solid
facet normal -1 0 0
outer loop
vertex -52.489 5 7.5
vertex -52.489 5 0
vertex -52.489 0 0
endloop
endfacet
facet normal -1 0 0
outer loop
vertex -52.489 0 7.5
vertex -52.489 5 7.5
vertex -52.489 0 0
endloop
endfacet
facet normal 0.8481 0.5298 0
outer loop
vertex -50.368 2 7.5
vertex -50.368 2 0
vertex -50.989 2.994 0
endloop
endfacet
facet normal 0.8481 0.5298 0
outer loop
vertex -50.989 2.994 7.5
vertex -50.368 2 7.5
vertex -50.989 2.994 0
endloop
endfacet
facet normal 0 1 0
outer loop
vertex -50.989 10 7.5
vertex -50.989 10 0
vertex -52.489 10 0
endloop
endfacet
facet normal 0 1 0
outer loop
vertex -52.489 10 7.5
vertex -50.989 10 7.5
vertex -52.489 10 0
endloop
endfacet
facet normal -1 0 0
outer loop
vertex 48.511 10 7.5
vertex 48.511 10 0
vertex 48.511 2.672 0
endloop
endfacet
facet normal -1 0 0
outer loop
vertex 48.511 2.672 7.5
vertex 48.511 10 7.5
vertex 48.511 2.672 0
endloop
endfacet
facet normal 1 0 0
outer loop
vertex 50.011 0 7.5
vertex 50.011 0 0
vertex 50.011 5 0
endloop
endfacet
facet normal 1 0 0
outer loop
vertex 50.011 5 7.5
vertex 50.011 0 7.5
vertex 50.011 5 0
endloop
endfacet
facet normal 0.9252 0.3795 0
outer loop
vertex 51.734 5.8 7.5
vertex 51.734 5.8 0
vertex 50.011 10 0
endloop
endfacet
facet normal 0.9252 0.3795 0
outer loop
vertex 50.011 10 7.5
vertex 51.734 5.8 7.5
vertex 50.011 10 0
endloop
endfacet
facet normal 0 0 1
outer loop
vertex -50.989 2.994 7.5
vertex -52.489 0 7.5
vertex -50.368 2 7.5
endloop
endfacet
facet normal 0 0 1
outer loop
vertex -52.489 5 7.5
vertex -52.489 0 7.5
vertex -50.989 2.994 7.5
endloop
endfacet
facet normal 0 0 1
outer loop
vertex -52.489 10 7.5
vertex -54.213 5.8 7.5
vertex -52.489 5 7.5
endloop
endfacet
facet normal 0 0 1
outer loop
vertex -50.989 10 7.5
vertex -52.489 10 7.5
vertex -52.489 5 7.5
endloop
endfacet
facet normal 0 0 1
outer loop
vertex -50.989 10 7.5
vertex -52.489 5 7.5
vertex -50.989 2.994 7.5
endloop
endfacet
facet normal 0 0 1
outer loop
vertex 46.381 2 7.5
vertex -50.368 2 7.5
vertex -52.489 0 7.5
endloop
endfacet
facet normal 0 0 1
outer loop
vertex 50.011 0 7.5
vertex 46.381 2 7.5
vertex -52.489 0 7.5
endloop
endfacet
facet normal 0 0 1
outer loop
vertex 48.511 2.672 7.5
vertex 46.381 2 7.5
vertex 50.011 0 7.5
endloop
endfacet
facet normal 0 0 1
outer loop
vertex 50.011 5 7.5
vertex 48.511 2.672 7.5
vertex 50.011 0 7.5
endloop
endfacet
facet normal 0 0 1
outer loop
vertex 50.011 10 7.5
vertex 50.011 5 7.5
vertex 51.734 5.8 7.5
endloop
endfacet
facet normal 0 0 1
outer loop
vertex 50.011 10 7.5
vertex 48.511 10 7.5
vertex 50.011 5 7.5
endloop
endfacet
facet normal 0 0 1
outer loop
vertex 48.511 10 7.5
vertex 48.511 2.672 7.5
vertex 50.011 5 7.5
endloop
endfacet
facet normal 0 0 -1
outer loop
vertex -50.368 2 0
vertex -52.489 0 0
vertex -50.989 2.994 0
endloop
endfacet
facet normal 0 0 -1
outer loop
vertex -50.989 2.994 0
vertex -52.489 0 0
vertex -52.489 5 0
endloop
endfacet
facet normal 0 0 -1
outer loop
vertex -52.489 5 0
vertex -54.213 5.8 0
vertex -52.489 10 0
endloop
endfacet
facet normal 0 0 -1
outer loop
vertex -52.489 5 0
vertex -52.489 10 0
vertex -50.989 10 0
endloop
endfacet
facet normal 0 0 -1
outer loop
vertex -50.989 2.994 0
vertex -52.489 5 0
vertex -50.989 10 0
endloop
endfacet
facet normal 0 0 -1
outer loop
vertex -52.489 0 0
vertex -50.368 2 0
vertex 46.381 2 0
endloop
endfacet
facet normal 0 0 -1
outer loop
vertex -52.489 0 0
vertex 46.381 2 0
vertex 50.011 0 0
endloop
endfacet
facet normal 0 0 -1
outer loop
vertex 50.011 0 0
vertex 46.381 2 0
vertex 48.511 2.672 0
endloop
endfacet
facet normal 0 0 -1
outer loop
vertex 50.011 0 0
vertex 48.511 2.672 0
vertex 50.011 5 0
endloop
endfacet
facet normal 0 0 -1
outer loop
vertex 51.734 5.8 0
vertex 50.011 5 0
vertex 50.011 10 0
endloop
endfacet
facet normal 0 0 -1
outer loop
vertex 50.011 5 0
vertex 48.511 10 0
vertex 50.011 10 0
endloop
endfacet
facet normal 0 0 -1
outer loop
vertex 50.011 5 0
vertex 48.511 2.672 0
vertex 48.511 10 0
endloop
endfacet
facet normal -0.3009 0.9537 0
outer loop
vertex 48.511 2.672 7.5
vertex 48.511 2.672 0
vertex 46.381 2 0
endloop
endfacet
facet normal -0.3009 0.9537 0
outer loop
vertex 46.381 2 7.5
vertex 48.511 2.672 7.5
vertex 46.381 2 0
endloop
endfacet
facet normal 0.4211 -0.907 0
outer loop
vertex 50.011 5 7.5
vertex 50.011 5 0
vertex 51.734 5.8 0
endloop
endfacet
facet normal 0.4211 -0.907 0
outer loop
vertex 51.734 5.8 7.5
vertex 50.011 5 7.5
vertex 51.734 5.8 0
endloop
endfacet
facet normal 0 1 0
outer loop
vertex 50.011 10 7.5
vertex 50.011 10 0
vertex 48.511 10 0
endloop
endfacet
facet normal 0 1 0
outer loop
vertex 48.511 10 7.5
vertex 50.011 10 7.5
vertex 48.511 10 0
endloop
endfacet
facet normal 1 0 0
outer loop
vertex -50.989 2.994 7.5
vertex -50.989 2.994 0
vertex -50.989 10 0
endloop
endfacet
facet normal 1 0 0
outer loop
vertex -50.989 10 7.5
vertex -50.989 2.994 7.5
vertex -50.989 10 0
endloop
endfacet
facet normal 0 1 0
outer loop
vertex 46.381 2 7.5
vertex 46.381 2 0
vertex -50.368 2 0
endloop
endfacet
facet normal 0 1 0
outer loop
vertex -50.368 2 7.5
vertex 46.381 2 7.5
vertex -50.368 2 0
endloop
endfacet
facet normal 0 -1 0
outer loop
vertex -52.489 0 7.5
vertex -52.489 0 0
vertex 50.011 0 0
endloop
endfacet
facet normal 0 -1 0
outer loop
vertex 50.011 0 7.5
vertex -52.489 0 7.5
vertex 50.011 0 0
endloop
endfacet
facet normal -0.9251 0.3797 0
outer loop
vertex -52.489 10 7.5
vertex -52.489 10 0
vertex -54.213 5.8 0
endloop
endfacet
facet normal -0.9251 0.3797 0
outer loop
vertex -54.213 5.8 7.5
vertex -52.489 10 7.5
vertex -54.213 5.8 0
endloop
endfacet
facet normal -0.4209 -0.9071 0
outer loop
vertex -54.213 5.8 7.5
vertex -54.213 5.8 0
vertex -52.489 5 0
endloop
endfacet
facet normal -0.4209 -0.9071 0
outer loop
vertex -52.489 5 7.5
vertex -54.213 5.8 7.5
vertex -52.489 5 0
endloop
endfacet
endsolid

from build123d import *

# Parameters (mm, degrees)
F1_DEPTH = 7.5


with BuildPart() as f1:
    # F0 (on Top) → F1 (new body)
    with BuildSketch(Plane.XY):
        Polygon((-50.989201, 2), (-52.489201, 2), (-52.489201, 0), (50.010799, 0), (50.010799, 2), (48.510799, 2), (46.381295, 2), (-50.367929, 2), align=None)
        Polygon((48.510799, 2), (50.010799, 2), (50.010799, 5), (50.010799, 10), (48.510799, 10), (48.510799, 2.672095), align=None)
        Polygon((48.510799, 2.672095), (46.381295, 2), (48.510799, 2), align=None)
        Polygon((-52.489201, 5), (-52.489201, 2), (-50.989201, 2), (-50.989201, 2.994474), (-50.989201, 10), (-52.489201, 10), align=None)
        Polygon((50.010799, 10), (50.010799, 5), (51.734168, 5.8), align=None)
        Polygon((-54.21257, 5.8), (-52.489201, 5), (-52.489201, 10), align=None)
        Polygon((-50.989201, 2.994474), (-50.989201, 2), (-50.367929, 2), align=None)
    extrude(amount=F1_DEPTH)


solid = f1.part
